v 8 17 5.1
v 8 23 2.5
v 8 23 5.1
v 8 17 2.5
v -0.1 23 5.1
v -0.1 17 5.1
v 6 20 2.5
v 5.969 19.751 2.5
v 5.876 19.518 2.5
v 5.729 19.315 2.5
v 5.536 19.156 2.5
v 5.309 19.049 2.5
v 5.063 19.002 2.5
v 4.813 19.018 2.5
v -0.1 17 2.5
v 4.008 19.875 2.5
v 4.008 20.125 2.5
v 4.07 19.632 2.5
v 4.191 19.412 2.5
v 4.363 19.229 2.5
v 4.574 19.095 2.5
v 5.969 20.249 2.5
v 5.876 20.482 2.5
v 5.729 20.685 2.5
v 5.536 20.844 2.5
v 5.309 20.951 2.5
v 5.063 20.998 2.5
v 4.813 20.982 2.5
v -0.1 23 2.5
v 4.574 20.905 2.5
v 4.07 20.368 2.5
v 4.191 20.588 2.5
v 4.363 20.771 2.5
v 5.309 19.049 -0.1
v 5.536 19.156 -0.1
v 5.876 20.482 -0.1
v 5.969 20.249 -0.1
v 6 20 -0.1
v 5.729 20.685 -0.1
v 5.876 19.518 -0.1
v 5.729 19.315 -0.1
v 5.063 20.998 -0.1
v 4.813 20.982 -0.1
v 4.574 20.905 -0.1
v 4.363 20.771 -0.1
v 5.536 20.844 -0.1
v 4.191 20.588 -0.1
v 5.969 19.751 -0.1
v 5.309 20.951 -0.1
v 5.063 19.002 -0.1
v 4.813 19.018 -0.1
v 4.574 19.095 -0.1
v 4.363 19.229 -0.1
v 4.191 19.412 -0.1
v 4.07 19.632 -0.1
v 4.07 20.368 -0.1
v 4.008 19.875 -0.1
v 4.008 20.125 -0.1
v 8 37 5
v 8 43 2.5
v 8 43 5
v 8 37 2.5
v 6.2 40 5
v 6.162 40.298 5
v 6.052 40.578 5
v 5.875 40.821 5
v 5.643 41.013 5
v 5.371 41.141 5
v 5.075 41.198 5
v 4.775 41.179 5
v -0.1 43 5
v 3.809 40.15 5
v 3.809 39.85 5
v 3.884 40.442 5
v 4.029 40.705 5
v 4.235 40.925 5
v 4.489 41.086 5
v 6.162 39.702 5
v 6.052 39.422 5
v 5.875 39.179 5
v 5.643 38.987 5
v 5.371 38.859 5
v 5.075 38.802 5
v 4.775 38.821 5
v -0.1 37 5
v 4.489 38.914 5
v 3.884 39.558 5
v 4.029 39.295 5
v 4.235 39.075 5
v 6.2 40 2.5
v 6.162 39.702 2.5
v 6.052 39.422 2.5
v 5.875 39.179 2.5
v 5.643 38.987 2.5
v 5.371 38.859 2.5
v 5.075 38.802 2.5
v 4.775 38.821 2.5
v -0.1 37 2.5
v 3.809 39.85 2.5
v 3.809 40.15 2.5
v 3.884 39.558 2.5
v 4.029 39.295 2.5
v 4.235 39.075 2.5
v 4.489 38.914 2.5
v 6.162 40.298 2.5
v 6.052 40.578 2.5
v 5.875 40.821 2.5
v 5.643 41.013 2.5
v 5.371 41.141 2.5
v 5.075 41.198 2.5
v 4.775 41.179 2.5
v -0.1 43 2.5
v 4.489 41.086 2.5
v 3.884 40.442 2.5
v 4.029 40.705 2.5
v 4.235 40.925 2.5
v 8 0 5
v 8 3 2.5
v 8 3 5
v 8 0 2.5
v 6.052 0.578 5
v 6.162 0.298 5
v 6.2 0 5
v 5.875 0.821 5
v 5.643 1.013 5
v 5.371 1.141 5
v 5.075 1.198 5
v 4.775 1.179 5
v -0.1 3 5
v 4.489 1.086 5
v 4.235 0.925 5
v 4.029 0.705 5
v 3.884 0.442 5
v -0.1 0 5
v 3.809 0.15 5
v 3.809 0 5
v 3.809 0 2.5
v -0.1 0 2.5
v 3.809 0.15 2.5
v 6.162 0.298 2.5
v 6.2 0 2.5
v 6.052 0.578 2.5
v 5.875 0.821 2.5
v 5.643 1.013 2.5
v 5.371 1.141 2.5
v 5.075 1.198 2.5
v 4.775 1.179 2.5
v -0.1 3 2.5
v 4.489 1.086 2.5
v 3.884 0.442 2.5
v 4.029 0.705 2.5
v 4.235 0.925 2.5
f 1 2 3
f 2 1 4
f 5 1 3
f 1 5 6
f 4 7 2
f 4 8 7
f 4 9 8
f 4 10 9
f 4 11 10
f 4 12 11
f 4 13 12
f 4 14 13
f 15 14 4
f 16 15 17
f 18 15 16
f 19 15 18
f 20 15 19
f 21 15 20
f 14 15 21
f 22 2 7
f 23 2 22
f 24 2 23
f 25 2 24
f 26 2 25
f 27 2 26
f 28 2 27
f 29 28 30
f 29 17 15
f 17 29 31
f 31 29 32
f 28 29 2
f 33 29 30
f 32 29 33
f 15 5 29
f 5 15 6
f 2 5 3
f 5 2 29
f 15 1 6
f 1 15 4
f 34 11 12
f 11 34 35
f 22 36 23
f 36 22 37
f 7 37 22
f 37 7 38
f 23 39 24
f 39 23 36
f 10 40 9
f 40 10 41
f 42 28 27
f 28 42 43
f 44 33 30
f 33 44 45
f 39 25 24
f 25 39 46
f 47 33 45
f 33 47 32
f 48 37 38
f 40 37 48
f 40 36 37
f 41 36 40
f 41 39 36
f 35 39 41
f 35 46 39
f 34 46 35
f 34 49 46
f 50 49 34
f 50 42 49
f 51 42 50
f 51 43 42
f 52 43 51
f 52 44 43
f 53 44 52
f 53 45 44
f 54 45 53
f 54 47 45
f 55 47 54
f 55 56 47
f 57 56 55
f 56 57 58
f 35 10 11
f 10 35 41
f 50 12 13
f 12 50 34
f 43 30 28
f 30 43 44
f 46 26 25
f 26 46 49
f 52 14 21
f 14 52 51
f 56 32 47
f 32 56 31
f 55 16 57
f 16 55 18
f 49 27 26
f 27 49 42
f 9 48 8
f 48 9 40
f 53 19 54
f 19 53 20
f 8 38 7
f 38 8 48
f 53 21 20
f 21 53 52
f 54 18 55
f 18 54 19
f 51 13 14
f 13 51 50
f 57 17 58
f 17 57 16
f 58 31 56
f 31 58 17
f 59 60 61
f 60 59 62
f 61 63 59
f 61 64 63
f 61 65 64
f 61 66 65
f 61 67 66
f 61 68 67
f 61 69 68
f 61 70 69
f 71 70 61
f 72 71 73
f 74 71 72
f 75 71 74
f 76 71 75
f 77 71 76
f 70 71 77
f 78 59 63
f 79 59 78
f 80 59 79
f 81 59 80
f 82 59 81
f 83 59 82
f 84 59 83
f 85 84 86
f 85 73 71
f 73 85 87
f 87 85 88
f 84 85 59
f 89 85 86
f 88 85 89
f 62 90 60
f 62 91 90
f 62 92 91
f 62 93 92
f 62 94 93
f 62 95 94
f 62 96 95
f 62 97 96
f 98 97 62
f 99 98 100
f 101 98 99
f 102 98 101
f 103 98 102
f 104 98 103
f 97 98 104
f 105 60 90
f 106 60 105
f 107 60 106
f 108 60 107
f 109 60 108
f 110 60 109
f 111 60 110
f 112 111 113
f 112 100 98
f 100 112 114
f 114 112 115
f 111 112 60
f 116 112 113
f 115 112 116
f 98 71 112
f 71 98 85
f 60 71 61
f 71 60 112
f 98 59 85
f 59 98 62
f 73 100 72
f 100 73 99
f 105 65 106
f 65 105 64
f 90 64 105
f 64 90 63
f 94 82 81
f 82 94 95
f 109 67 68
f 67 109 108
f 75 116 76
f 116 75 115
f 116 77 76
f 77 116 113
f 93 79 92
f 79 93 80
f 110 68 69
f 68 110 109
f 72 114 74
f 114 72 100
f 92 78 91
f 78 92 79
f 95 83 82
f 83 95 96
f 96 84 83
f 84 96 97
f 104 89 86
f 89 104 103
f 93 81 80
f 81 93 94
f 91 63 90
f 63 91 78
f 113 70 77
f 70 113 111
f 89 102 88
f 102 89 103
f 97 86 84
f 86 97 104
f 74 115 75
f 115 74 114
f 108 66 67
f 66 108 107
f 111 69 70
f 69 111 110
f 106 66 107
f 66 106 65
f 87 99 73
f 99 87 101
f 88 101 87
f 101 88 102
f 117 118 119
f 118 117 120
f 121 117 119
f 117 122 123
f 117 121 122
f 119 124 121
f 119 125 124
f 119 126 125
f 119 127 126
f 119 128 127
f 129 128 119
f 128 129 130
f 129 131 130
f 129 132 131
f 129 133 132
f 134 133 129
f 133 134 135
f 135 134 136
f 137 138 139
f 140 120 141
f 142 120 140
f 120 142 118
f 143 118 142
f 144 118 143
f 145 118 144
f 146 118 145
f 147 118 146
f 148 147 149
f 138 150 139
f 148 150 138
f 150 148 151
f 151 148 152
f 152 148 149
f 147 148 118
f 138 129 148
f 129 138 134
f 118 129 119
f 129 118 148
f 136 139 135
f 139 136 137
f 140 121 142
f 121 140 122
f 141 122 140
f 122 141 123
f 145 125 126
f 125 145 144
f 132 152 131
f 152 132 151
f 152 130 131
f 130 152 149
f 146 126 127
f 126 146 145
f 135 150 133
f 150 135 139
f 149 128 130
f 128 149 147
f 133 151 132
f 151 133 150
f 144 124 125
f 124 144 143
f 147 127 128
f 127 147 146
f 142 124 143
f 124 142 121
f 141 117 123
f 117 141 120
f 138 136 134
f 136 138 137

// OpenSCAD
// file: Settings.scad
// Mesurements Of Platform Actual & Global Settings

// Mesurements ACTUAL

PlateWidth = 228;
PlateDepth = 145;
PlateHeight = 5;

ArmWidth = 20;
ArmHeight = 24;
ArmForwardProjection = 25;
ArmRearProjection = 50;
ArmVOffset = 15;

BaseWidth = 129;
BaseHeight = 5;
BaseForwardProjection = 10;
BaseRearProjection = 10;
BaseVOffset = 20;

BaseDeflectorLength = 20;
BaseDeflectorAngle = 45;

ScrewsWidthOutset = 35;
ScrewsDepthOutset = 35;
ScrewsHeadRadius = 10;
ScrewsHeadHeight = 2;
ScrewsHeadProtrusion = 5;
ScrewsShaftRadius = 2;
ScrewsHeadCutoutRadius = 2;


RearPlugWidth = 10;
RearPlugHeight = 5;
RearPlugVOffset = 1;





// Options
d = 0.1;


ClipSticksize = 3;
PlateThickness = 8;

SlideGap = 6;

//lips to keep the belt in
Lip = 3;
TopLip = 500;
UpperLip = 500;
LowerLip = 500;
BottomLip = 500;


RollerCore = 2;
RollerClearance = 0.5;
RollerLength = PlateDepth - 2*RollerClearance;

UpperRollerProjection  = 40;
UpperRollerRadius = 8;

LowerRollerProjection = 20;
LowerRollerRadius = 6;

UpperRollerBearingCutoutRadius = 3;
LowerRollerBearingCutoutRadius = 3;

// Calculated


PlateArmOverhang = PlateWidth/2 - BaseWidth/2  - ArmWidth; 
// main file
include <Settings.scad>;

ConnectorDefaults_Length = 8;
ConnectorDefaults_Width = 6;
ConnectorDefaults_Thickness = 5;
ConnectorDefaults_HoleRadius = 1;
ConnectorDefaults_SlipRadius = 0.2; // Radius increase in clip to allow thread to slip

ConnectorTest();

module Clip(
Length =ConnectorDefaults_Length,
Width = ConnectorDefaults_Width,
Thickness = ConnectorDefaults_Thickness,
HoleRadius = ConnectorDefaults_HoleRadius,
SlipRadius = ConnectorDefaults_SlipRadius){
	translate(v = [0,-Width/2,Thickness/2])
		difference(){
			translate(v = [-d,0,0]){
				cube(size=[Length+d,Width,Thickness/2]);
			}
			translate(v = [Length-(Width/2),Width/2,-d])
				color("blue")cylinder(h=Thickness+2*d,r= HoleRadius+SlipRadius, $fn =25);
		}
}

module ClipHole(
Length =ConnectorDefaults_Length,
Width = ConnectorDefaults_Width,
Thickness = ConnectorDefaults_Thickness,
HoleRadius = ConnectorDefaults_HoleRadius){
translate(v = [0,-Width/2,Thickness/2])
	union(){
		translate(v = [-d,0,0])
			cube(size=[Length+d,Width,Thickness/2+d]);
		translate(v = [Length-(Width/2),Width/2,(-Thickness/2)-d])
			color("red")cylinder(h=Thickness+2*d,r= HoleRadius, $fn =25);
	}
}





module ConnectorTest(){

	translate(v = [0,20,0])
		ClipHole();

	translate(v = [0,40,0])
		Clip();

	%color("green") difference(){
		union(){
			difference(){
				translate(v = [-5,-10,0])
					cube(size = [30,20,5]);
			
				translate(v = [0,0,0])
					ClipHole();
			}
		}
		translate(v = [-6,-22,-1])
			color("green") cube(size = [32,22,7]);
	}

	difference(){
		translate(v = [0,0,0])
			color("red") Clip();
		translate(v = [-6,-22,-1])
			color("red") cube(size = [32,22,7]);
	}
}
